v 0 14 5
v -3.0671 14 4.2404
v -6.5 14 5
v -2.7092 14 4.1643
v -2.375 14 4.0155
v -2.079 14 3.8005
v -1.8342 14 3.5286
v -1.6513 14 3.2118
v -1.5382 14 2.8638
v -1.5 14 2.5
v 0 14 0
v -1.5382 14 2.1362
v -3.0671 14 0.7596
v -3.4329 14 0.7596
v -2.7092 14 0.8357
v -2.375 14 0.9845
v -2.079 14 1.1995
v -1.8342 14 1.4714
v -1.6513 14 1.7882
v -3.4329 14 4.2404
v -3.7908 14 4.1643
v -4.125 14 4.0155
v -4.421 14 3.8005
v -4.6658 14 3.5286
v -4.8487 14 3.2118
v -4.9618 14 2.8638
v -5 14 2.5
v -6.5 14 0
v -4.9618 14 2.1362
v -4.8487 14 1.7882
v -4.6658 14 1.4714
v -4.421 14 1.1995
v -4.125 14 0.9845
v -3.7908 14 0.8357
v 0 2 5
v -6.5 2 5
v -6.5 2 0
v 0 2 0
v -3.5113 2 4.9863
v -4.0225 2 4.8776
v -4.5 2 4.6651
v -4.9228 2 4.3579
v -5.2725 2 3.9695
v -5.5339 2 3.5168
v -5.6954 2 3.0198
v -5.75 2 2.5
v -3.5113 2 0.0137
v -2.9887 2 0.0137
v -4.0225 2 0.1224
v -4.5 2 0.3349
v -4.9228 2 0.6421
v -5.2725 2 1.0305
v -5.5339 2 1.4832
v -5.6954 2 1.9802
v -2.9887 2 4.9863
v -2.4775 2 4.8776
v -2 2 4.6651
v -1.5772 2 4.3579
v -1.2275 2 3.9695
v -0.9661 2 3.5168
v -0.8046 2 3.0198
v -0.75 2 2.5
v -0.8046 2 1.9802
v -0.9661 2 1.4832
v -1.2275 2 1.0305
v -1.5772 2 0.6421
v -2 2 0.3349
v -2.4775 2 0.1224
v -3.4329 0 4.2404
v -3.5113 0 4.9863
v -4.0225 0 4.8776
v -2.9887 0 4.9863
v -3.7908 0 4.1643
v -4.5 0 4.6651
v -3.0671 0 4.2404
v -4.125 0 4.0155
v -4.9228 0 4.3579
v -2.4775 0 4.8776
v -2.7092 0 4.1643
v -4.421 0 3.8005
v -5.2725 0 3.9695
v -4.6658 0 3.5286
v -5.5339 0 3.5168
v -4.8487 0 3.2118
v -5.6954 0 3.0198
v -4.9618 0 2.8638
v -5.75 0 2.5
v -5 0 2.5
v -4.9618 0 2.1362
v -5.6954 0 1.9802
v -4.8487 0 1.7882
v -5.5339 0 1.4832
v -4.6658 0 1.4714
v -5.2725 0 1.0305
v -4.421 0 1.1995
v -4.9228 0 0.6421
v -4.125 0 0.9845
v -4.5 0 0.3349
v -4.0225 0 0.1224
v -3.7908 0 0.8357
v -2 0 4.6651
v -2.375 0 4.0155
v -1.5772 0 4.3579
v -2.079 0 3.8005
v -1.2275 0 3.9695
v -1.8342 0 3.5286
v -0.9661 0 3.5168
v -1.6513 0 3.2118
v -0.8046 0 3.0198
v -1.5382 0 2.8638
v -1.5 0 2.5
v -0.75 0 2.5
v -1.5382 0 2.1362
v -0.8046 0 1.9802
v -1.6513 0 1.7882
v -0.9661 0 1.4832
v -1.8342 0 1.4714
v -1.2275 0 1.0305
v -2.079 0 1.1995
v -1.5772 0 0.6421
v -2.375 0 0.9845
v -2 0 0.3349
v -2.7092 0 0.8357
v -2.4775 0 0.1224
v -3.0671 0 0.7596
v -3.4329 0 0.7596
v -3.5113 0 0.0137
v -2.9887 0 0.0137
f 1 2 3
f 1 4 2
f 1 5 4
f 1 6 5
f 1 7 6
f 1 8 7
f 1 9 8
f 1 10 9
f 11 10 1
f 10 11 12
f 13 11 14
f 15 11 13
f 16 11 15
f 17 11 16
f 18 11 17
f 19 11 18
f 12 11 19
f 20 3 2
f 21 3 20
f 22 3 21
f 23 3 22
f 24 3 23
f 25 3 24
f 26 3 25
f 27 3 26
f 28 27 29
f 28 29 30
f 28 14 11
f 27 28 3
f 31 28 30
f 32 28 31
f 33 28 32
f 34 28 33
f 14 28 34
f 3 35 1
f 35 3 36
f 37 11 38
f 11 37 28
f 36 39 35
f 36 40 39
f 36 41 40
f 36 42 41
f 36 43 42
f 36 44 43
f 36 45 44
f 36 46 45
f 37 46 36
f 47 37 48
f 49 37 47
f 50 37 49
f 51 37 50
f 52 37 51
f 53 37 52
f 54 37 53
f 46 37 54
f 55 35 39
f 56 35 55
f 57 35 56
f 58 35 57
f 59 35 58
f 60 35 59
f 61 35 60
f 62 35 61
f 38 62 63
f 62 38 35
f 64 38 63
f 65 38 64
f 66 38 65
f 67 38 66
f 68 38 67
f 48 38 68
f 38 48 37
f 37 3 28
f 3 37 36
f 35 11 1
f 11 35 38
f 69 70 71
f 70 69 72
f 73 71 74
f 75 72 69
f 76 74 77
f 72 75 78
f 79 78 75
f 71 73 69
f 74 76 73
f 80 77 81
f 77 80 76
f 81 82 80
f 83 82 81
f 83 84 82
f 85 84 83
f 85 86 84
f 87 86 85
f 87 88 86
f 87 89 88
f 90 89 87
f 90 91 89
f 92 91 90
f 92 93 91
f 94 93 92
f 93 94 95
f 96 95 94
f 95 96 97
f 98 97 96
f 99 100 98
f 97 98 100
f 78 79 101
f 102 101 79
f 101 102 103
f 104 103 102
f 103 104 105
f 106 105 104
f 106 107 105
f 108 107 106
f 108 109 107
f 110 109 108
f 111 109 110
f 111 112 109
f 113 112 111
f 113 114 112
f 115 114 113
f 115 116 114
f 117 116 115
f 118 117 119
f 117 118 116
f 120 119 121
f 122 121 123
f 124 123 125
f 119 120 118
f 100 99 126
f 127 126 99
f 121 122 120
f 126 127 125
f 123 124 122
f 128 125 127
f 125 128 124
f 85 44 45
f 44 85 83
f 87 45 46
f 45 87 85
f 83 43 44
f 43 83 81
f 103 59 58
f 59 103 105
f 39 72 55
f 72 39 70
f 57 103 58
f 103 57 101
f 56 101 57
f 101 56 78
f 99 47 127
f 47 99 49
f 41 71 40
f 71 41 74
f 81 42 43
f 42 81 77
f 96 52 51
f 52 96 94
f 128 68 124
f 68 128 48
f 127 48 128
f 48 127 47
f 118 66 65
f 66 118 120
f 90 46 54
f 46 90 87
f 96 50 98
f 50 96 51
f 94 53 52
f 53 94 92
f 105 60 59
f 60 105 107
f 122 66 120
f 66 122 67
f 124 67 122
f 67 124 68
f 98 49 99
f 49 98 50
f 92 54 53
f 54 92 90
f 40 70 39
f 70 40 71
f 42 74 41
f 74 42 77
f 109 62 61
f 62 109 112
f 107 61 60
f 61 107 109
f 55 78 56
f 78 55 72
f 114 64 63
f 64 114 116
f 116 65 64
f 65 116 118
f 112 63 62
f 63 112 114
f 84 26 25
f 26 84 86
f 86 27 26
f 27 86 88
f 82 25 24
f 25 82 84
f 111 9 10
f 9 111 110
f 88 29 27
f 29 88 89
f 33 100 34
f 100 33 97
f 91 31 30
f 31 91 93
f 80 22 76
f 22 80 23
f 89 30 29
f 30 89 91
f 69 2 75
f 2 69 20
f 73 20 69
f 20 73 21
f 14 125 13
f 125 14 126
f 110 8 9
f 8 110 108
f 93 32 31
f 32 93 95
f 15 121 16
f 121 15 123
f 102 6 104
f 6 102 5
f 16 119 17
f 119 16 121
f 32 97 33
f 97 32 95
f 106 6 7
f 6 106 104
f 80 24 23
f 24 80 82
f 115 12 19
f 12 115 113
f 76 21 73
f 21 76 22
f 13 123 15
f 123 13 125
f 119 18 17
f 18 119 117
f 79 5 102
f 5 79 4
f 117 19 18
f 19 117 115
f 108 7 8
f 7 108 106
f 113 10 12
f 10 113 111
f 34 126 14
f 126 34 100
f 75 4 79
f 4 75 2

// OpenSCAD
include <../../lib/device/component.scad>;

rotate([0,0,90]) jack();
